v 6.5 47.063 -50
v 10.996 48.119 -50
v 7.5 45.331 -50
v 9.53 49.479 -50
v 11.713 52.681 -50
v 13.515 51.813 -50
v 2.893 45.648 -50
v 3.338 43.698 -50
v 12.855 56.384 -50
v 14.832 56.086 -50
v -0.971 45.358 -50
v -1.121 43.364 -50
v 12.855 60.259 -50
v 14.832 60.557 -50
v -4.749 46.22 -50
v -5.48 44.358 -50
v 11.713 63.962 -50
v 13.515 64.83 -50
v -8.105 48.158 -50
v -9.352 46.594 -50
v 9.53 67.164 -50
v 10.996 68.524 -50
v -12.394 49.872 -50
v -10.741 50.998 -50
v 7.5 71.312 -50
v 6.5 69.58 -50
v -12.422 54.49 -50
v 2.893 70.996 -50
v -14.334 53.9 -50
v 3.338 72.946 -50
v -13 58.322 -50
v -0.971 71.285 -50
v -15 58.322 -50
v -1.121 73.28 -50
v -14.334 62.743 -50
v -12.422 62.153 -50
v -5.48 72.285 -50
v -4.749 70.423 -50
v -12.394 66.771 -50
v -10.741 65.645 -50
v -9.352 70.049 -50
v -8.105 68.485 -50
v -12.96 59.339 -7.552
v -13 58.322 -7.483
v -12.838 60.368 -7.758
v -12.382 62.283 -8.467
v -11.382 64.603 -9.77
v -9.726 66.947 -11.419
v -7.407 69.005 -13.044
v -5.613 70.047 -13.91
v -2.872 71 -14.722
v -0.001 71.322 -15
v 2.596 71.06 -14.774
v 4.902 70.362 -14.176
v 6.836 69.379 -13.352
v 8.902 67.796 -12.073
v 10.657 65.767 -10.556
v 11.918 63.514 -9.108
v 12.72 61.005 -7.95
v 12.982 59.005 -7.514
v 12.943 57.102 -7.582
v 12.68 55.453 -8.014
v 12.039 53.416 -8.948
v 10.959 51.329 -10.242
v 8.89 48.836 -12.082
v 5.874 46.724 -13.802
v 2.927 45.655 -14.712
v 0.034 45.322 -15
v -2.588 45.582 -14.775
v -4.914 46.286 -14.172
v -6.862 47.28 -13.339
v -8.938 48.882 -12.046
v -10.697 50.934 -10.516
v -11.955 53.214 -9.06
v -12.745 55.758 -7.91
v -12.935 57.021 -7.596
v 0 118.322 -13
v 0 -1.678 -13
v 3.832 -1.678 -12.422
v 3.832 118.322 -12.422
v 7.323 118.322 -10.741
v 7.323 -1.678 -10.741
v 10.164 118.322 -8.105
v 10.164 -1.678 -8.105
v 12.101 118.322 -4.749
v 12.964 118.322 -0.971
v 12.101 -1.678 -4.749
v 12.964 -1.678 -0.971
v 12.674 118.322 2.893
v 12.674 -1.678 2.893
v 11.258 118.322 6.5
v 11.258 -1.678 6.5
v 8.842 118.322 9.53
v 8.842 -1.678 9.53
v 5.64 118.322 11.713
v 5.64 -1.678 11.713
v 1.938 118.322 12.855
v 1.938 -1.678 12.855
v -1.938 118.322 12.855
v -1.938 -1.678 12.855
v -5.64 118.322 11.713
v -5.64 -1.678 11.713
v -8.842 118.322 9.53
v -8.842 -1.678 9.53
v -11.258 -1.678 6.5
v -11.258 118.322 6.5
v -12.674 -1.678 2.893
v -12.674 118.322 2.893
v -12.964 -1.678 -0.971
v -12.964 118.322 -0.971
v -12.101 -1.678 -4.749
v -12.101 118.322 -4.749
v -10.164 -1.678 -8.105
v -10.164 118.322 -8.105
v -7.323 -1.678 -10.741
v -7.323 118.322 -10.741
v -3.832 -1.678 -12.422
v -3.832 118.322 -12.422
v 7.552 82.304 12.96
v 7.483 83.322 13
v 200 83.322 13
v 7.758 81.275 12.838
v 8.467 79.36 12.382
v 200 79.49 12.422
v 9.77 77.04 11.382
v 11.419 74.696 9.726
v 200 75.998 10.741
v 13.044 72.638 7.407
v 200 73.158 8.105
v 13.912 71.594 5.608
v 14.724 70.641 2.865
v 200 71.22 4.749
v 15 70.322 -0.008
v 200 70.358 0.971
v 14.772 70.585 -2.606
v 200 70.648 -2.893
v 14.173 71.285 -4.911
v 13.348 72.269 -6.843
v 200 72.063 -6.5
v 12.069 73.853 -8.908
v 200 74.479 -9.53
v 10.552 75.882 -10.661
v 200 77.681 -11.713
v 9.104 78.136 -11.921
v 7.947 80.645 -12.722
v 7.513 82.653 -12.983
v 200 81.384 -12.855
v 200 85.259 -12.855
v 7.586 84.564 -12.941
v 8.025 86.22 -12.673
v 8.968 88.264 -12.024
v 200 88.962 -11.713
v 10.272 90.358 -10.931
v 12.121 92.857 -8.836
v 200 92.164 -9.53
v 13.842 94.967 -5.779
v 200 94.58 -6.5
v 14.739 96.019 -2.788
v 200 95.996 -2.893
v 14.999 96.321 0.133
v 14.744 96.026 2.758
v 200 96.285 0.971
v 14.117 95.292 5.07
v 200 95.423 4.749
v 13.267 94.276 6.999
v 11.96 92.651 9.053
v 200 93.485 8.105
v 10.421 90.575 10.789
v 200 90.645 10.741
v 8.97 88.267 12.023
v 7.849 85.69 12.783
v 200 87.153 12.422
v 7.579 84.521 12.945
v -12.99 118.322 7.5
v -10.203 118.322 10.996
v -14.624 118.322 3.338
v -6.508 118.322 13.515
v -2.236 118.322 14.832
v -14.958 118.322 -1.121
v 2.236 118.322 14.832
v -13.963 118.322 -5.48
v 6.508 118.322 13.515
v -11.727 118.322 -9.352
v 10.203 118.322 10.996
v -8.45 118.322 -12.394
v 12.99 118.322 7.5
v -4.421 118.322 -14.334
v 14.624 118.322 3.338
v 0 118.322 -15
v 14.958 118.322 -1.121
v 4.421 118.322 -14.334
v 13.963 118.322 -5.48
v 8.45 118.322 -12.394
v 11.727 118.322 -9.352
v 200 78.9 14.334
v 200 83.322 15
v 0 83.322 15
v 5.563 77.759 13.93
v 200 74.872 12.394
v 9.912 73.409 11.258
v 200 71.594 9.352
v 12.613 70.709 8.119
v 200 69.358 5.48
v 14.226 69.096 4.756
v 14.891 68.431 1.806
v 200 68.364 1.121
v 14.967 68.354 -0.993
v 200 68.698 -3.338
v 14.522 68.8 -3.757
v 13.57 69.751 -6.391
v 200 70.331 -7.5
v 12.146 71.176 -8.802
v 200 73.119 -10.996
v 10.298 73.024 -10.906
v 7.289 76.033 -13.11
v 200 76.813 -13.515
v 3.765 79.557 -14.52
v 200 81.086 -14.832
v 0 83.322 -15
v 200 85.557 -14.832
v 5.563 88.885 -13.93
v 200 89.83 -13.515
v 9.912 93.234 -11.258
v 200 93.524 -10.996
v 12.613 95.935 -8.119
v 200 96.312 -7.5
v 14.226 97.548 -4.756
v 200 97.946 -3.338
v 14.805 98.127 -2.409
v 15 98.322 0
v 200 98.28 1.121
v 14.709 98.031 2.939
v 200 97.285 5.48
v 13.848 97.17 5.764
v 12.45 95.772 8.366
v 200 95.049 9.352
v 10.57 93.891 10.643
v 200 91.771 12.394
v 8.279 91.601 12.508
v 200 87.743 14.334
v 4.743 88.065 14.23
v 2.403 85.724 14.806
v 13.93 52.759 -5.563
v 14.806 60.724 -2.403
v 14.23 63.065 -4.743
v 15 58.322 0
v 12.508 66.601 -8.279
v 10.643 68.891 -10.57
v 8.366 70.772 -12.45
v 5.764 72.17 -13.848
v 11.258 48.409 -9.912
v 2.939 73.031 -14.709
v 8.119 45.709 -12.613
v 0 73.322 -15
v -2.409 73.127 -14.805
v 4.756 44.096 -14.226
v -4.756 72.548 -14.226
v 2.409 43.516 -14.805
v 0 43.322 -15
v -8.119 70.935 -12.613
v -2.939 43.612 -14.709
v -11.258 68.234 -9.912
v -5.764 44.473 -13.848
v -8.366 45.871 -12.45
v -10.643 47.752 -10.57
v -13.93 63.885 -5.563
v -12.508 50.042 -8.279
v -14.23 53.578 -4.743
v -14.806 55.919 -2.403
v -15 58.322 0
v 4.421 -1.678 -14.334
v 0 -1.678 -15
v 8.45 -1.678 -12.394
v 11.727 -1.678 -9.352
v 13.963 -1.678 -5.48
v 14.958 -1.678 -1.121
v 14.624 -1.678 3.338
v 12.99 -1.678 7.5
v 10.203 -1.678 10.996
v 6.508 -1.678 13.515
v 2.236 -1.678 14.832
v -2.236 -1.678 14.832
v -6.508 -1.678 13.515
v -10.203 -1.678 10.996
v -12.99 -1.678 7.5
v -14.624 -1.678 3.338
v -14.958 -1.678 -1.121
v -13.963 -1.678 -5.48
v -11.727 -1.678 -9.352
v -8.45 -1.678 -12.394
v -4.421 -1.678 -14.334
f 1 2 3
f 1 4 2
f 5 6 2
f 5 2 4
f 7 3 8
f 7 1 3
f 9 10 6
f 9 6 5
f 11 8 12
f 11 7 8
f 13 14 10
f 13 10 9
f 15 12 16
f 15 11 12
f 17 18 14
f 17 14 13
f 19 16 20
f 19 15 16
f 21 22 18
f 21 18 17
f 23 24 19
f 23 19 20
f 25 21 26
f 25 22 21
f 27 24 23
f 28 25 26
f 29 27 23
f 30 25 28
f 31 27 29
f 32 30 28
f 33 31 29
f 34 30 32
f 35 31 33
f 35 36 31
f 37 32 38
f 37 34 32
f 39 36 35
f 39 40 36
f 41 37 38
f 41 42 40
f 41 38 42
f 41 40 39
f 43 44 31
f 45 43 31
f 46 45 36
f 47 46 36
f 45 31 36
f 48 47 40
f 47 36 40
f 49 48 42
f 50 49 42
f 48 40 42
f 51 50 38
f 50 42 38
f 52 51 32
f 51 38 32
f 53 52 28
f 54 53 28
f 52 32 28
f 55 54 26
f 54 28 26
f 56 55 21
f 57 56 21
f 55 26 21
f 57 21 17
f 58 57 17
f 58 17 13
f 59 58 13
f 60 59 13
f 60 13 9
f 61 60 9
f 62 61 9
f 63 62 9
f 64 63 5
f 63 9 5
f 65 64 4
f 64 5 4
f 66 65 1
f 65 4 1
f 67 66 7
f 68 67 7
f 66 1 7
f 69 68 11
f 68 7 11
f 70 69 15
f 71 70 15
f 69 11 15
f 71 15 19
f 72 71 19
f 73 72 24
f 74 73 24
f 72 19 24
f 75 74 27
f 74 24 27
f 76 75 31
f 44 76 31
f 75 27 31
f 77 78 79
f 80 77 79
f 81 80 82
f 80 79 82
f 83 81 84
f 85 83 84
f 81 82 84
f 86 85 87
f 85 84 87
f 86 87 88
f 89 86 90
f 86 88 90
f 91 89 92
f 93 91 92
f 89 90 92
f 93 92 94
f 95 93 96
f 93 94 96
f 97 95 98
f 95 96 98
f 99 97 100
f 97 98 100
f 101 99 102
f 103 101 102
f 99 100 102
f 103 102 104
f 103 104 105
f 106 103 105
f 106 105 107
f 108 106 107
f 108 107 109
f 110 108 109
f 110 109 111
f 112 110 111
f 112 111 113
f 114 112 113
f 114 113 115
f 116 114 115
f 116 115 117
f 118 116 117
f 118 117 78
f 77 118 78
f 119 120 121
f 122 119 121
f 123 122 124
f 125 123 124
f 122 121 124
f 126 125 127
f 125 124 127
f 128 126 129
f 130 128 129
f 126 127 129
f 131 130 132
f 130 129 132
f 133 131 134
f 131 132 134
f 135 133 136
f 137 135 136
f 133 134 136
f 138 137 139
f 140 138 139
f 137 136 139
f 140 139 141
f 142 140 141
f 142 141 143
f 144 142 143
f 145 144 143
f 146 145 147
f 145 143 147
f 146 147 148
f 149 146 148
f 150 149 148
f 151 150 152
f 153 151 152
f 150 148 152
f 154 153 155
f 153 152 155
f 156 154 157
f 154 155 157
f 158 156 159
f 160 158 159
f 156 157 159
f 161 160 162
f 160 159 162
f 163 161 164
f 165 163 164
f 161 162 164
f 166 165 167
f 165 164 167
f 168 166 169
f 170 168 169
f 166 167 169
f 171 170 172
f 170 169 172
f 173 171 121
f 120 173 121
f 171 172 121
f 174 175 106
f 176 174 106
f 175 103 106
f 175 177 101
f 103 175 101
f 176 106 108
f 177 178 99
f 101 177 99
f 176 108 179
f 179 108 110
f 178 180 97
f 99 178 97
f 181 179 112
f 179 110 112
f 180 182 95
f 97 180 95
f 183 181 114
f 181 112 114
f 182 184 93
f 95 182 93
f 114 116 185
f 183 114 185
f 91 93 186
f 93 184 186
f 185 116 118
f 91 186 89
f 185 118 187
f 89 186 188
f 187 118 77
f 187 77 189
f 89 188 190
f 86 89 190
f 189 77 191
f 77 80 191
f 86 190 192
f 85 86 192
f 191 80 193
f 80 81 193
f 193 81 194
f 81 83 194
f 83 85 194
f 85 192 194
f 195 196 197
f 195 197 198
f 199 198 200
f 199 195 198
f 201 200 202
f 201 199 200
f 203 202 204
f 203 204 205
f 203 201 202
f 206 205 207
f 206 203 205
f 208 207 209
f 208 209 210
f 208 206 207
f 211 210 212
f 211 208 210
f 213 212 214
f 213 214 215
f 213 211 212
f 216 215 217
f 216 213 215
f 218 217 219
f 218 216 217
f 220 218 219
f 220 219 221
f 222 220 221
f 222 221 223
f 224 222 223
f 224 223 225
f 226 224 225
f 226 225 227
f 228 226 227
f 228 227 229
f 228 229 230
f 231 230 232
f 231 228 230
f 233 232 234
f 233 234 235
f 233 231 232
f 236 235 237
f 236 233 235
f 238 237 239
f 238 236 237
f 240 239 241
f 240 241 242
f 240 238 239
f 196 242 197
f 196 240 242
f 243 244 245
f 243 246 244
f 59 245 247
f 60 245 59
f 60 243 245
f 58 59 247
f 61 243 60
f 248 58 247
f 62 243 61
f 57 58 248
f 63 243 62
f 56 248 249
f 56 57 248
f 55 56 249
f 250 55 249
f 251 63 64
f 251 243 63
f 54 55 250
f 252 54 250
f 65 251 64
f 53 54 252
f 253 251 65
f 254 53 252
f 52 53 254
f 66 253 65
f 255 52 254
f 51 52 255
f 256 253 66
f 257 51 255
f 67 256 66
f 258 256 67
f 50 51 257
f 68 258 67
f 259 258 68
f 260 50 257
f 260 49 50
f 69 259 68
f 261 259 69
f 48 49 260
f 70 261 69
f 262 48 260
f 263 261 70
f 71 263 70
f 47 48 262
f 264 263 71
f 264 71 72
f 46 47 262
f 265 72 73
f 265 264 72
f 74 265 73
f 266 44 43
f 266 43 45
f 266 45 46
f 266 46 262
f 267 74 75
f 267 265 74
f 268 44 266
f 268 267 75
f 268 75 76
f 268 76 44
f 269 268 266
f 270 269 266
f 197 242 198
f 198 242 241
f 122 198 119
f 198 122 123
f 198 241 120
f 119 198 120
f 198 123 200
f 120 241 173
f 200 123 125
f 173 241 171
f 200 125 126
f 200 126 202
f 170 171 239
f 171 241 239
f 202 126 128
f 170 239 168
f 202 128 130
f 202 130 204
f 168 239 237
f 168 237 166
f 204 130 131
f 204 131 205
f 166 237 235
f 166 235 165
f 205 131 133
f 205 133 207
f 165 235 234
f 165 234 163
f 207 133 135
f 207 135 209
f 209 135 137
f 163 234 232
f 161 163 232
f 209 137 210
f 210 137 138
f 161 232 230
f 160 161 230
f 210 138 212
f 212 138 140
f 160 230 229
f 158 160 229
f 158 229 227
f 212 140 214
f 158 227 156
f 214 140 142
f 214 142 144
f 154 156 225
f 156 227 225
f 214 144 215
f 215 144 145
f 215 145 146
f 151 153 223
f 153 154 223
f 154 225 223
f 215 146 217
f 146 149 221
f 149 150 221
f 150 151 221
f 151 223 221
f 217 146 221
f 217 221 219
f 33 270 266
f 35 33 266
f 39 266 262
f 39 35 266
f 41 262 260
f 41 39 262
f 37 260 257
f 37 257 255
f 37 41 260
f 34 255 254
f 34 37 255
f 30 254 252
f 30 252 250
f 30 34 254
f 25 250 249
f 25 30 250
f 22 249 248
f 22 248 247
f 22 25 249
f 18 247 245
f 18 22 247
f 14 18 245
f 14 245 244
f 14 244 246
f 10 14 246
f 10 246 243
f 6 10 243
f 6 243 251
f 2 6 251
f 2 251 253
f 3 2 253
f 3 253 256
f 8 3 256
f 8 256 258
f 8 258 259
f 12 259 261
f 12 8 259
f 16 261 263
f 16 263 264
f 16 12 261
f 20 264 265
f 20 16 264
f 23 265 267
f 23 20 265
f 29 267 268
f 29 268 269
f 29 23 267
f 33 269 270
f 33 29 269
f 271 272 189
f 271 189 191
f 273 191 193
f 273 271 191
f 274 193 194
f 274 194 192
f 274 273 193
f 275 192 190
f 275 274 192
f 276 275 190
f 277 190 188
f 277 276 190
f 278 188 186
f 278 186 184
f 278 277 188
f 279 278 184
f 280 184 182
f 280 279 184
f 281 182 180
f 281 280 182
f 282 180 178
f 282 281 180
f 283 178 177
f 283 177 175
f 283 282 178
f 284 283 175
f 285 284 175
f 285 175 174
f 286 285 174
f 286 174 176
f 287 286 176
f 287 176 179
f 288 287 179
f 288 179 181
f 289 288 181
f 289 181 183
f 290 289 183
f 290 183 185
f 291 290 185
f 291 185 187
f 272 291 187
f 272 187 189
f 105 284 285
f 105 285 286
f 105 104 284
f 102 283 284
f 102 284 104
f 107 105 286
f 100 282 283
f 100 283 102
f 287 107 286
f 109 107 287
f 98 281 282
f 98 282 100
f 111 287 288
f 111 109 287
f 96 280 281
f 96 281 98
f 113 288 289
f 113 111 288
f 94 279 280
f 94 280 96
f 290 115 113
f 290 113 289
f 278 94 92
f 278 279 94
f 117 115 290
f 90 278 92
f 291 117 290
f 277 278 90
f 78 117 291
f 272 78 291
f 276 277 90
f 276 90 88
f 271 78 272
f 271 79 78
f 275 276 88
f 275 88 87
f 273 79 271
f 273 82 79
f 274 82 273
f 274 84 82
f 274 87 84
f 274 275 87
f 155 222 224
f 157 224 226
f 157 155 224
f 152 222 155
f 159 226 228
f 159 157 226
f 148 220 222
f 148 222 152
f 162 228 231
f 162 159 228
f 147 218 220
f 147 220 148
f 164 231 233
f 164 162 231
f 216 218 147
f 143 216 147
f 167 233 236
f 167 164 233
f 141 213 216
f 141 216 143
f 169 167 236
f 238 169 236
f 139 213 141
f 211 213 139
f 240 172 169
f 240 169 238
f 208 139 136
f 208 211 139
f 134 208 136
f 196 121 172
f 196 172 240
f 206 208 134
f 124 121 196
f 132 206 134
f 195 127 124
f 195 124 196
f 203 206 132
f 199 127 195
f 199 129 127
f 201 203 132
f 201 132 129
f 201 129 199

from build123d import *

# Parameters (mm, degrees)
SWEEP_THIN6_PROFILE_R   = 15
SWEEP_THIN6_PROFILE_R_2 = 13
SWEEP_THIN8_PROFILE_R   = 15
SWEEP_THIN8_PROFILE_R_2 = 13
CUT_EXTRUDE1_START      = -185
SKETCH135_R             = 15
CUT_EXTRUDE1_DEPTH      = 185
SWEEP_THIN9_PROFILE_R   = 15
SWEEP_THIN9_PROFILE_R_2 = 13
SKETCH183_R             = 15
CUT_EXTRUDE2_DEPTH      = 239.537208858


with BuildPart() as part:
    # Sweep-Thin6: sweep along a path in Sketch1
    with BuildLine(Plane(origin=(0, 0, 0), x_dir=(0, 0, -1), z_dir=(1, 0, 0))) as sweep_thin6_path:
        Line((0, 118.321595662), (0, -1.678404338))
    # Sweep-Thin6 profile (on start of the path) → Sweep-Thin6 (sweep)
    with BuildSketch(Plane(origin=(0, 118.321595662, 0), x_dir=(0, 0, -1), z_dir=(0, -1, 0))):
        Circle(SWEEP_THIN6_PROFILE_R)
        Circle(SWEEP_THIN6_PROFILE_R_2, mode=Mode.SUBTRACT)
    sweep(path=sweep_thin6_path.line)


with BuildPart() as body_2:
    # Sweep-Thin8: sweep along a path in Sketch66
    with BuildLine(Plane(origin=(0, 0, 0), x_dir=(0, 0, -1), z_dir=(1, 0, 0))) as sweep_thin8_path:
        Line((0, 58.321595662), (50, 58.321595662))
    # Sweep-Thin8 profile (on start of the path) → Sweep-Thin8 (sweep)
    with BuildSketch(Plane(origin=(0, 58.321595662, 0), x_dir=(-1, 0, 0), z_dir=(0, 0, -1))):
        Circle(SWEEP_THIN8_PROFILE_R)
        Circle(SWEEP_THIN8_PROFILE_R_2, mode=Mode.SUBTRACT)
    sweep(path=sweep_thin8_path.line)

    # Sketch135 → Cut-Extrude1 (cut)
    with BuildSketch(Plane(origin=(0, 118.321595662, 0), x_dir=(1, 0, 0), z_dir=(0, 1, 0)).offset(CUT_EXTRUDE1_START)):
        Circle(SKETCH135_R)
    extrude(amount=CUT_EXTRUDE1_DEPTH, mode=Mode.SUBTRACT)


with BuildPart() as body_3:
    # Sweep-Thin9: sweep along a path in Sketch142
    with BuildLine(Plane.XY) as sweep_thin9_path:
        Line((0, 58.321595662), (0, 83.321595662))
        Line((0, 83.321595662), (200, 83.321595662))
    # Sweep-Thin9 profile (on start of the path) → Sweep-Thin9 (sweep)
    with BuildSketch(Plane.ZX.offset(58.321595662)):
        Circle(SWEEP_THIN9_PROFILE_R)
        Circle(SWEEP_THIN9_PROFILE_R_2, mode=Mode.SUBTRACT)
    sweep(path=sweep_thin9_path.line, transition=Transition.RIGHT)

    # Sketch183 → Cut-Extrude2 (cut, through all)
    with BuildSketch(Plane(origin=(0, 118.321595662, 0), x_dir=(1, 0, 0), z_dir=(0, 1, 0))):
        Circle(SKETCH183_R)
    extrude(amount=-CUT_EXTRUDE2_DEPTH, mode=Mode.SUBTRACT)


solid = Compound([part.part, body_2.part, body_3.part])
